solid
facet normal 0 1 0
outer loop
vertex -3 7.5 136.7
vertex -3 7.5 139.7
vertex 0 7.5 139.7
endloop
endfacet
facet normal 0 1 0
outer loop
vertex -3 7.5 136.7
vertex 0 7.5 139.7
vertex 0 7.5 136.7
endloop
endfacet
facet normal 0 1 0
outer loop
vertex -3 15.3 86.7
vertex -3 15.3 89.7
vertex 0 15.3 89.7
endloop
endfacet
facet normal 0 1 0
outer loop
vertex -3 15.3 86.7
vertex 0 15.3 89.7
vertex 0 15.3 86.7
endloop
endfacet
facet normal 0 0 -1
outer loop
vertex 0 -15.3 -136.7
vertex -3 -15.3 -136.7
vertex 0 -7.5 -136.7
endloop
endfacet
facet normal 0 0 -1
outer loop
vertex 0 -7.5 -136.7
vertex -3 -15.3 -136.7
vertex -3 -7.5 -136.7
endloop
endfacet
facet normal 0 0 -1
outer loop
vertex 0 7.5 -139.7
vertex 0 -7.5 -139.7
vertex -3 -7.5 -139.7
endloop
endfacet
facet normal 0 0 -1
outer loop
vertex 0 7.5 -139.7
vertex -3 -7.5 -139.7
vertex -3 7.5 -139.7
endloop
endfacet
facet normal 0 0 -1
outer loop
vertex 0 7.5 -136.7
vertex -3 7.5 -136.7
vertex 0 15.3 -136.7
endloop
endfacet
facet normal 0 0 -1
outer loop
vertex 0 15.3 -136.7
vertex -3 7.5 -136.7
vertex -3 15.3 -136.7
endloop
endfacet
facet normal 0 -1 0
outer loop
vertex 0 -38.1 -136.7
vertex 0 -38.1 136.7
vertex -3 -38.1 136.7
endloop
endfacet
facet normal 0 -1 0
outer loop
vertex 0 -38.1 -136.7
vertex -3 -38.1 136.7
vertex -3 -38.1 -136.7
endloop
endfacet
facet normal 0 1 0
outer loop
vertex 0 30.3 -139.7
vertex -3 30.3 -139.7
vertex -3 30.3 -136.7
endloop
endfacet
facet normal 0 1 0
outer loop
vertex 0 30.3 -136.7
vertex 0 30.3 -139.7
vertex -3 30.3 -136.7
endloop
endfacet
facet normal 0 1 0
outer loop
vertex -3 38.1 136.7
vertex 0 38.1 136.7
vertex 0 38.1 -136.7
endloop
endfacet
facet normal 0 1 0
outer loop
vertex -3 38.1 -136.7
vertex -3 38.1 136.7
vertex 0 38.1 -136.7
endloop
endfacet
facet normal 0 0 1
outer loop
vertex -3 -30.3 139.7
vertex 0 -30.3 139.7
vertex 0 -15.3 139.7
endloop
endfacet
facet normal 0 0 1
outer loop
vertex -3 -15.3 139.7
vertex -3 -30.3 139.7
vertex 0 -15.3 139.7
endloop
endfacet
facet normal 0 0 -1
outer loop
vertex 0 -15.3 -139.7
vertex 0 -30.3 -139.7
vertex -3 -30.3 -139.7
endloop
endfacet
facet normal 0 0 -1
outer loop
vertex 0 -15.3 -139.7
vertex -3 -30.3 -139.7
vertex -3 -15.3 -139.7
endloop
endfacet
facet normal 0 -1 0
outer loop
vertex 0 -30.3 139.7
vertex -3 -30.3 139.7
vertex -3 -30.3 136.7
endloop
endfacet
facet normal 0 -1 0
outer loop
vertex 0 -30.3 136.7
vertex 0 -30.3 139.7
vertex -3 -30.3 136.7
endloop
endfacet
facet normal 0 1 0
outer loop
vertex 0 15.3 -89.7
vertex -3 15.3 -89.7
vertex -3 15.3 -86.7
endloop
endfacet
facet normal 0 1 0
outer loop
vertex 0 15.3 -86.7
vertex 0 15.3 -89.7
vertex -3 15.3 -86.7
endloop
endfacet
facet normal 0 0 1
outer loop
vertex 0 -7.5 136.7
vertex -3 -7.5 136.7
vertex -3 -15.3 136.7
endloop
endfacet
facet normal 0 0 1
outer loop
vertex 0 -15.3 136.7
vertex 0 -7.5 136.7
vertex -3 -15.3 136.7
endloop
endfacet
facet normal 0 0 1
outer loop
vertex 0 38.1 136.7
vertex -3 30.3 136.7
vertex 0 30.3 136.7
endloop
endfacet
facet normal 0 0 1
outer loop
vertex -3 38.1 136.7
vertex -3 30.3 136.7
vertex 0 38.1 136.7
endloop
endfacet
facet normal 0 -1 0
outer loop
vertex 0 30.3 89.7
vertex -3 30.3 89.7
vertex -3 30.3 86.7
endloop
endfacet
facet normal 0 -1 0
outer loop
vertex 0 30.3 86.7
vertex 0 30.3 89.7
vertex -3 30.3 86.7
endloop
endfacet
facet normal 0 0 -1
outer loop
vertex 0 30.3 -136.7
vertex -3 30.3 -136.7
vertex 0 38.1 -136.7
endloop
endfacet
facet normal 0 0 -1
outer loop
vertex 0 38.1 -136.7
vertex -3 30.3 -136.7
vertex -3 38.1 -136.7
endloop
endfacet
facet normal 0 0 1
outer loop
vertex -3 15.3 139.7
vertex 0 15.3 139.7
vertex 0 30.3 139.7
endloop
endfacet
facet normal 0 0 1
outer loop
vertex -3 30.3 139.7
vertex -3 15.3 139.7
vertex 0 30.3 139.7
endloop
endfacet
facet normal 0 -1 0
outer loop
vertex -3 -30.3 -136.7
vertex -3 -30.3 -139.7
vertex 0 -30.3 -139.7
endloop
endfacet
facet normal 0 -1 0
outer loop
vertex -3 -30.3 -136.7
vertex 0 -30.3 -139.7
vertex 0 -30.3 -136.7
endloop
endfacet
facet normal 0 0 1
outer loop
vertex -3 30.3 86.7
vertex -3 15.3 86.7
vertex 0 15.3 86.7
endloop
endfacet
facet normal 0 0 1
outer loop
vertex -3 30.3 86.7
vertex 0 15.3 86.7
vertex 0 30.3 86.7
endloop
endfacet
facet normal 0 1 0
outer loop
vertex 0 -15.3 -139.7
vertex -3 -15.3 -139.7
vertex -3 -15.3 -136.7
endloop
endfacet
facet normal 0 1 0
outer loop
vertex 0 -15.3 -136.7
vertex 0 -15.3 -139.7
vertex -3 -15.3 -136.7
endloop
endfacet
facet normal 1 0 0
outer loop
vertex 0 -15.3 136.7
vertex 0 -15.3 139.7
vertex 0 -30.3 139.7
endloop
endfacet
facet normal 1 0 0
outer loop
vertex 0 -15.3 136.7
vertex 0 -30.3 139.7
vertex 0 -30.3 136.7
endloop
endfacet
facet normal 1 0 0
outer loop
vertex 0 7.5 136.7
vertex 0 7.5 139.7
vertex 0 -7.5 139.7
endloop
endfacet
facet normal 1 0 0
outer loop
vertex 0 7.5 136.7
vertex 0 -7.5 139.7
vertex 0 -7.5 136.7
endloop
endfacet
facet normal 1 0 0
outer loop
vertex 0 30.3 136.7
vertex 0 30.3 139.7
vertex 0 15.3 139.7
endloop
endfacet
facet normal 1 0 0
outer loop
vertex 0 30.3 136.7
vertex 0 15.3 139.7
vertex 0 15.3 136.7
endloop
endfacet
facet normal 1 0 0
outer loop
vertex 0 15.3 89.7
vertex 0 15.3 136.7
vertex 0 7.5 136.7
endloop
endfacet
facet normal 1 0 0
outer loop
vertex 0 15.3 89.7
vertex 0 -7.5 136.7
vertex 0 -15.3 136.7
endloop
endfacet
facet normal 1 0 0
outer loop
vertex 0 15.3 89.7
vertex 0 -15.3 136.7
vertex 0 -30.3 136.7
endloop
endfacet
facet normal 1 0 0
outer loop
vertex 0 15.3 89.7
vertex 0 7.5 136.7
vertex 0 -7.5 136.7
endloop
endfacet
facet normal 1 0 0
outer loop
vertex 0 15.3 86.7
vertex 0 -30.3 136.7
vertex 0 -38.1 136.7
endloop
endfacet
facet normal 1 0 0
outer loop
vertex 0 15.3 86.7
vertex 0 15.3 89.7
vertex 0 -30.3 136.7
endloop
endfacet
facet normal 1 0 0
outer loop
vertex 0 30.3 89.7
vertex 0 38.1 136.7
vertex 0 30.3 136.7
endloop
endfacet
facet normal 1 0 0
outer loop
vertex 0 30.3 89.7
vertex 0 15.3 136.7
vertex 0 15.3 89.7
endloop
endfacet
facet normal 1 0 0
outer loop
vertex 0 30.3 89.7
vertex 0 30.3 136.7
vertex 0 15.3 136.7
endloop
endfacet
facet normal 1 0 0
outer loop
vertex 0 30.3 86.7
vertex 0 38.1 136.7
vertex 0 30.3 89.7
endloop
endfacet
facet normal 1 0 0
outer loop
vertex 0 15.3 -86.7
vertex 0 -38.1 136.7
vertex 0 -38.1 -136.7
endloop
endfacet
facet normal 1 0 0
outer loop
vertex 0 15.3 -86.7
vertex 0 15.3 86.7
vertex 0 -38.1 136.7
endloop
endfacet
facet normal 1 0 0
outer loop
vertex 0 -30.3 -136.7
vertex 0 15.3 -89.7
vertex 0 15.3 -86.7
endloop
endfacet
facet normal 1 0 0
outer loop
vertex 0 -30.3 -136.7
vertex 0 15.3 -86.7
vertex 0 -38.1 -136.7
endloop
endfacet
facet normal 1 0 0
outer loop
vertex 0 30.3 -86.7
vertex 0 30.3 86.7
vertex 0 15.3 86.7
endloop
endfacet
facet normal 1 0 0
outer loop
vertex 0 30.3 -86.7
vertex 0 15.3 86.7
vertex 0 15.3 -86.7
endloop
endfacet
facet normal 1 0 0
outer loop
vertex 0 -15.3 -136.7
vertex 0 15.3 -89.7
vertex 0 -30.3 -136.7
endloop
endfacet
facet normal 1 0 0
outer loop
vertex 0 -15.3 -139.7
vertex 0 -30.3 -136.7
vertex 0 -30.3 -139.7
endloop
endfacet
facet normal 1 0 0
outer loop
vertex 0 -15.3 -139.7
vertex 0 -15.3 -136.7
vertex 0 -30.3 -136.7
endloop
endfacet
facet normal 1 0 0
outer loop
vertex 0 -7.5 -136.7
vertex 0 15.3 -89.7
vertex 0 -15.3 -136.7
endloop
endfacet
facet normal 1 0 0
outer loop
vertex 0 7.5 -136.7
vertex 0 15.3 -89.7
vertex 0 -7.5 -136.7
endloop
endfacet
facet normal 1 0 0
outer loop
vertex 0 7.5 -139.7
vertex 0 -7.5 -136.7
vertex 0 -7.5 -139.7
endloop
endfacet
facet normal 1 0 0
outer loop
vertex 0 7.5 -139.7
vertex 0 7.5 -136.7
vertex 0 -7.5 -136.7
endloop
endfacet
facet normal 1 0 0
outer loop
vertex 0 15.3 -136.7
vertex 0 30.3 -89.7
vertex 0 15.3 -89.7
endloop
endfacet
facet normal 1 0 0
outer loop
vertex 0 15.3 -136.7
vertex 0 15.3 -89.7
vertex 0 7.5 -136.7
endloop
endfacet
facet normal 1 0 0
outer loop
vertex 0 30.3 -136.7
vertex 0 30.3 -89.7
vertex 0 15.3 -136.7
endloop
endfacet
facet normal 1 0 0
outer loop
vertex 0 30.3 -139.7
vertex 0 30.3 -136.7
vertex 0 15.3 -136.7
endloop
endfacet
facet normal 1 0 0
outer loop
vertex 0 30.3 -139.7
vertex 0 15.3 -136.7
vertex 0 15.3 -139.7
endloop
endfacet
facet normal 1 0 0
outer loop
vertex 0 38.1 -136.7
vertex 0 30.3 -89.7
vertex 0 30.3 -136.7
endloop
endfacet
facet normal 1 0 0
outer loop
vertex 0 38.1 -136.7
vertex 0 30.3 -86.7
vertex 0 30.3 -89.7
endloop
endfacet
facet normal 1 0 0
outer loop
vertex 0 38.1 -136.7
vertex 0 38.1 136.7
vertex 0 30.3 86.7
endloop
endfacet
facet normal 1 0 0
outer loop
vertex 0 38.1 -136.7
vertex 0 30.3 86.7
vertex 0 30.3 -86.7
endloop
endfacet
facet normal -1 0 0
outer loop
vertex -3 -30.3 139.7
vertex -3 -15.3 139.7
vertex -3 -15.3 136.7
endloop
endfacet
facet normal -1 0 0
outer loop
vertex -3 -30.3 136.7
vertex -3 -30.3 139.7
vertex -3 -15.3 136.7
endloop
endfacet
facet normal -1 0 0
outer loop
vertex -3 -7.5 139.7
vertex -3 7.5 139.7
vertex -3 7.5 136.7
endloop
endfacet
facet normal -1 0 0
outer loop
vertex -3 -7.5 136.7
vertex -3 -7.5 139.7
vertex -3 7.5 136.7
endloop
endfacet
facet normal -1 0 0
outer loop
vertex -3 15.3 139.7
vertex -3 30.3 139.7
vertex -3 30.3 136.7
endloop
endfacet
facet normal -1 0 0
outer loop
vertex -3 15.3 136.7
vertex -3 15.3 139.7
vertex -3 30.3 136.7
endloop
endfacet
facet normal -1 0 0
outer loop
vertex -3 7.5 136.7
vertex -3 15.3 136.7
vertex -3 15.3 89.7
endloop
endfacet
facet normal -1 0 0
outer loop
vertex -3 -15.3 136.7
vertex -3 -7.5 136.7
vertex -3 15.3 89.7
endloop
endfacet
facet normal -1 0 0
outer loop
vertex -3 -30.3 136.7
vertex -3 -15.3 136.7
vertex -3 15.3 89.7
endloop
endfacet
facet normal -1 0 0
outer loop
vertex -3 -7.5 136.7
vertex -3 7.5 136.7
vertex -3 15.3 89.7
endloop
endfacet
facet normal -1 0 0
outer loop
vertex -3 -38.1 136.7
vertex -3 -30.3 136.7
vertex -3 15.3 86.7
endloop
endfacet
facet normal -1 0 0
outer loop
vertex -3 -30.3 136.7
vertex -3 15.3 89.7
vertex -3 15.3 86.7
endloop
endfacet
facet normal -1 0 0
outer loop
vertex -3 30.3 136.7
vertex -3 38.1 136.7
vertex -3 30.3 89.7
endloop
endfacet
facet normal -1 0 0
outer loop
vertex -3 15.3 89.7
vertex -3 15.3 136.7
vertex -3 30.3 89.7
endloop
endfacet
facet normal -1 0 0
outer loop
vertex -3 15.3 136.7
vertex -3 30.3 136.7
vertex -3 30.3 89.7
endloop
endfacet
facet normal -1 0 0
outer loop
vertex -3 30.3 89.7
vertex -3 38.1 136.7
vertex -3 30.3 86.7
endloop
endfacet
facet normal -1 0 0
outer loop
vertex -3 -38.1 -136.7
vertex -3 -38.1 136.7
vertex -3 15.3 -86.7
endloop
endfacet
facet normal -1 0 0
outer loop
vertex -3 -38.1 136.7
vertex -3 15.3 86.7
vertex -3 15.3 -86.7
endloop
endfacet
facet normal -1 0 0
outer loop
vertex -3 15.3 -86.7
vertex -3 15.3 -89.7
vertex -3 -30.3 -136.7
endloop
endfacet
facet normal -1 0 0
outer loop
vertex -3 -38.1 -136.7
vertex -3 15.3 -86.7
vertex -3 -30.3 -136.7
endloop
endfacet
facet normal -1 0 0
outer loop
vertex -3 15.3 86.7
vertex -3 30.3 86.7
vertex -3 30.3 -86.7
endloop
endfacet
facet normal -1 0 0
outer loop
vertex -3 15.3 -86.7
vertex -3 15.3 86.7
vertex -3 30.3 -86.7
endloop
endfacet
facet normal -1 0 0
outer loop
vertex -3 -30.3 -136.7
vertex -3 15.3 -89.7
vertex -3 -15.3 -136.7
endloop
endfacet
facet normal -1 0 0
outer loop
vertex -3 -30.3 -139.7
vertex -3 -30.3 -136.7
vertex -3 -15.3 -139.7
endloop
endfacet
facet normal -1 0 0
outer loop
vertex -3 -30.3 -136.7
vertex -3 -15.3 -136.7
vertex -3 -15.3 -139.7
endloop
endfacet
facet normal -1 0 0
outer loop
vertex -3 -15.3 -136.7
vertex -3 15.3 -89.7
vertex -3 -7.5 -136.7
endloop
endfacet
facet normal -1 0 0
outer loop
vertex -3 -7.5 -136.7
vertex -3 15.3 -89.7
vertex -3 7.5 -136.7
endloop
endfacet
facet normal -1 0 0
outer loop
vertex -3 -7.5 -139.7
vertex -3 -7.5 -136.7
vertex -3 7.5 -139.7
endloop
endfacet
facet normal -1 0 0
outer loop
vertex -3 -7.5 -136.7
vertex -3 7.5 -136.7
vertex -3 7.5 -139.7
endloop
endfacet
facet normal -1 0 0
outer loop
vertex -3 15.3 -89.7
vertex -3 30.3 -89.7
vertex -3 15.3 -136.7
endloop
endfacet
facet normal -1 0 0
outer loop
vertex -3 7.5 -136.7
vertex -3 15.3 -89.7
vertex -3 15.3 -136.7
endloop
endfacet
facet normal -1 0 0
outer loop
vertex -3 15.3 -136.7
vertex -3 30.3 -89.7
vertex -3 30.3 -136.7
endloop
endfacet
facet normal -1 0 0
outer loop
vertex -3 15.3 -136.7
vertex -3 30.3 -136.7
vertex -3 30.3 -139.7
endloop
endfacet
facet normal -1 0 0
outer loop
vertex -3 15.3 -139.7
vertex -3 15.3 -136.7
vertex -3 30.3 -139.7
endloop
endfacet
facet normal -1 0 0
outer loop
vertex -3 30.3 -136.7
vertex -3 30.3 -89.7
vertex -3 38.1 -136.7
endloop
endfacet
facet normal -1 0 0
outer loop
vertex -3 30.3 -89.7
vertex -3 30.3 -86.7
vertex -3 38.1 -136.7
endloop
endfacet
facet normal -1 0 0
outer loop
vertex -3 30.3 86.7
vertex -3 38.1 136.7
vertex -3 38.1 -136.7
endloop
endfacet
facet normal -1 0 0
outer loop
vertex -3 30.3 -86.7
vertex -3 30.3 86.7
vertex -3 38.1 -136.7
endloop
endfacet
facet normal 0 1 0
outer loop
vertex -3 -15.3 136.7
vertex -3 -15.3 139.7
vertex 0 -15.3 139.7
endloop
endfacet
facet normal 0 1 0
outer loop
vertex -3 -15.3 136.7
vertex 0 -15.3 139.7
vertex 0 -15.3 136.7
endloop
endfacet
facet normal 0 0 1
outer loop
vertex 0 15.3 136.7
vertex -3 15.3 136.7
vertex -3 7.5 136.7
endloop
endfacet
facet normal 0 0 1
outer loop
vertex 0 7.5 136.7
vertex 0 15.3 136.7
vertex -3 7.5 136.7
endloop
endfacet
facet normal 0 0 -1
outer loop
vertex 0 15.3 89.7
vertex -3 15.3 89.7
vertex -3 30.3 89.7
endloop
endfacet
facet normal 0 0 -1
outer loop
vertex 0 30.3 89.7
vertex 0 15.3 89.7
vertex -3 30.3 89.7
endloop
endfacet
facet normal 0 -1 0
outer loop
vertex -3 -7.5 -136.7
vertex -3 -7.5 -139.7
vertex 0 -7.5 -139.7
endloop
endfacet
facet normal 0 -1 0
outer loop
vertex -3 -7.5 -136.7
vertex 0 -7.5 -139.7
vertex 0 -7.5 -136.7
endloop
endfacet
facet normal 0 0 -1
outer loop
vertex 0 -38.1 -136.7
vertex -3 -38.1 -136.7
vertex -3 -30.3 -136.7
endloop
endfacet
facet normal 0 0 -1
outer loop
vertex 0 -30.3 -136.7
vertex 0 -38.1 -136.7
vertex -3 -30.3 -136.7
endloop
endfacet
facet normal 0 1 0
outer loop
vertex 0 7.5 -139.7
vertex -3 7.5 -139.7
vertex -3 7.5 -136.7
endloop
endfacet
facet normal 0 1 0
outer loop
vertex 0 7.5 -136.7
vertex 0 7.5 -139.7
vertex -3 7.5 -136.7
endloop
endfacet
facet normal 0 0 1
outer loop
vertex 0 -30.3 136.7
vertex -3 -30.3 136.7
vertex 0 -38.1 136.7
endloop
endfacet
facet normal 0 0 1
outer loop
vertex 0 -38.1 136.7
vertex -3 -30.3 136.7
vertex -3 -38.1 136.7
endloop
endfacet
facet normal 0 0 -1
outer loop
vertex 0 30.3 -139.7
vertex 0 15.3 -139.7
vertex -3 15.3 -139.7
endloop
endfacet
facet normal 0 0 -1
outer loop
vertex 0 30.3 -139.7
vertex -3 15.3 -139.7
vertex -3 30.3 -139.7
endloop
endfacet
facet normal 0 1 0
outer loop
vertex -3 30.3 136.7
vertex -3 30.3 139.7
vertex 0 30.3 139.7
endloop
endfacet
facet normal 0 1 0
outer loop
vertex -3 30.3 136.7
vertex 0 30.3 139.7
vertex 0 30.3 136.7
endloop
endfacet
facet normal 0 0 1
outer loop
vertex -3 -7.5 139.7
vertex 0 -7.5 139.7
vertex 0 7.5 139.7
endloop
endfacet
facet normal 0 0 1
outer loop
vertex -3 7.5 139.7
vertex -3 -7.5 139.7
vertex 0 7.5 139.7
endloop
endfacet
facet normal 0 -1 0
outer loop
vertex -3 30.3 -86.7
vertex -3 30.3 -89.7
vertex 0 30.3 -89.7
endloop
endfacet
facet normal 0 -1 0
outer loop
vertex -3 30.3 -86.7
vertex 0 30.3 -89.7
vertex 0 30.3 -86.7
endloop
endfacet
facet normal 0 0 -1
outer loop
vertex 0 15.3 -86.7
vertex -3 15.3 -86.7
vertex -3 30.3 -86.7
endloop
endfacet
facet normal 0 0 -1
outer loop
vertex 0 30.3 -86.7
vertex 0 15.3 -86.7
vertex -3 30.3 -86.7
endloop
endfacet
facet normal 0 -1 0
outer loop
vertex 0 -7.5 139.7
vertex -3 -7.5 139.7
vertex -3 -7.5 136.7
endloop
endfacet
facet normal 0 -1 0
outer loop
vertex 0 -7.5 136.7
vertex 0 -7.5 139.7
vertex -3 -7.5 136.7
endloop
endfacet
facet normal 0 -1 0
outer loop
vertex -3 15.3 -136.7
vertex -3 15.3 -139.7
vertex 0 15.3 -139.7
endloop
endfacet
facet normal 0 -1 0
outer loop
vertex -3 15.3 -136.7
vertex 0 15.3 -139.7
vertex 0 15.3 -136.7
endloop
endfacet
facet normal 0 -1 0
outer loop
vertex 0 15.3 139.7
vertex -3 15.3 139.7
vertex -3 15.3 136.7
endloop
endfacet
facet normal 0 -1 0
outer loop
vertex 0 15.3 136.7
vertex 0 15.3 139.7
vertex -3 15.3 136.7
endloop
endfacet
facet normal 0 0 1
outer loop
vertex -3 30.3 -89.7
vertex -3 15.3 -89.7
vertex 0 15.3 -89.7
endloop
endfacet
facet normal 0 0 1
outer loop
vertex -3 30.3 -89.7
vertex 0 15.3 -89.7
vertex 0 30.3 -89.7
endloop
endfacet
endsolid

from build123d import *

# Parameters (mm, degrees)
SKETCH1_W               = 279.4
SKETCH1_H               = 76.2
BOSS_EXTRUDE1_DEPTH     = 3
SKETCH3_W               = 3
SKETCH3_H               = 7.8
CUT_EXTRUDE1_DEPTH      = 145.833352512
LPATTERN1_COUNT         = 4
LPATTERN1_PITCH         = 22.8
MIRROR1_COPY_1_SKETCH_W = 3
MIRROR1_COPY_1_SKETCH_H = 7.8
MIRROR1_COPY_1_DEPTH    = 145.833352512
MIRROR1_COPY_2_SKETCH_W = 3
MIRROR1_COPY_2_SKETCH_H = 7.8
MIRROR1_COPY_2_DEPTH    = 145.833352512
MIRROR1_COPY_3_SKETCH_W = 3
MIRROR1_COPY_3_SKETCH_H = 7.8
MIRROR1_COPY_3_DEPTH    = 145.833352512
SKETCH5_W               = 3
SKETCH5_H               = 15
CUT_EXTRUDE3_DEPTH      = 10


with BuildPart() as part:
    # Sketch1 → Boss-Extrude1 (new body)
    with BuildSketch(Plane(origin=(0, 0, 0), x_dir=(0, 0, -1), z_dir=(1, 0, 0))):
        Rectangle(SKETCH1_W, SKETCH1_H)
    extrude(amount=-BOSS_EXTRUDE1_DEPTH)

    # Sketch3 → Cut-Extrude1 (cut, through all)
    with BuildSketch(Plane.ZY.offset(3)):
        with Locations((-138.2, 34.2)):
            Rectangle(SKETCH3_W, SKETCH3_H)
    cut_extrude1 = extrude(amount=-CUT_EXTRUDE1_DEPTH, mode=Mode.SUBTRACT)

    # LPattern1: Cut-Extrude1 ×4
    with Locations(*[(0, -i * LPATTERN1_PITCH, 0) for i in range(1, LPATTERN1_COUNT)]):
        add(cut_extrude1, mode=Mode.SUBTRACT)

    # Mirror1: Cut-Extrude1 across plane
    add(cut_extrude1.mirror(Plane.XY), mode=Mode.SUBTRACT)

    # Mirror1 copy 1 sketch → Mirror1 copy 1 (cut, through all)
    with BuildSketch(Plane(origin=(-3, -22.8, 0), x_dir=(0, 0, -1), z_dir=(-1, 0, 0))):
        with Locations((-138.2, -34.2)):
            Rectangle(MIRROR1_COPY_1_SKETCH_W, MIRROR1_COPY_1_SKETCH_H)
    extrude(amount=-MIRROR1_COPY_1_DEPTH, mode=Mode.SUBTRACT)

    # Mirror1 copy 2 sketch → Mirror1 copy 2 (cut, through all)
    with BuildSketch(Plane(origin=(-3, -45.6, 0), x_dir=(0, 0, -1), z_dir=(-1, 0, 0))):
        with Locations((-138.2, -34.2)):
            Rectangle(MIRROR1_COPY_2_SKETCH_W, MIRROR1_COPY_2_SKETCH_H)
    extrude(amount=-MIRROR1_COPY_2_DEPTH, mode=Mode.SUBTRACT)

    # Mirror1 copy 3 sketch → Mirror1 copy 3 (cut, through all)
    with BuildSketch(Plane(origin=(-3, -68.4, 0), x_dir=(0, 0, -1), z_dir=(-1, 0, 0))):
        with Locations((-138.2, -34.2)):
            Rectangle(MIRROR1_COPY_3_SKETCH_W, MIRROR1_COPY_3_SKETCH_H)
    extrude(amount=-MIRROR1_COPY_3_DEPTH, mode=Mode.SUBTRACT)

    # Sketch5 → Cut-Extrude3 (cut)
    with BuildSketch(Plane.ZY.offset(3)):
        with Locations((-88.2, 22.8)):
            Rectangle(SKETCH5_W, SKETCH5_H)
    cut_extrude3 = extrude(amount=-CUT_EXTRUDE3_DEPTH, mode=Mode.SUBTRACT)

    # Mirror2: Cut-Extrude3 across plane
    add(cut_extrude3.mirror(Plane.XY), mode=Mode.SUBTRACT)


solid = part.part
